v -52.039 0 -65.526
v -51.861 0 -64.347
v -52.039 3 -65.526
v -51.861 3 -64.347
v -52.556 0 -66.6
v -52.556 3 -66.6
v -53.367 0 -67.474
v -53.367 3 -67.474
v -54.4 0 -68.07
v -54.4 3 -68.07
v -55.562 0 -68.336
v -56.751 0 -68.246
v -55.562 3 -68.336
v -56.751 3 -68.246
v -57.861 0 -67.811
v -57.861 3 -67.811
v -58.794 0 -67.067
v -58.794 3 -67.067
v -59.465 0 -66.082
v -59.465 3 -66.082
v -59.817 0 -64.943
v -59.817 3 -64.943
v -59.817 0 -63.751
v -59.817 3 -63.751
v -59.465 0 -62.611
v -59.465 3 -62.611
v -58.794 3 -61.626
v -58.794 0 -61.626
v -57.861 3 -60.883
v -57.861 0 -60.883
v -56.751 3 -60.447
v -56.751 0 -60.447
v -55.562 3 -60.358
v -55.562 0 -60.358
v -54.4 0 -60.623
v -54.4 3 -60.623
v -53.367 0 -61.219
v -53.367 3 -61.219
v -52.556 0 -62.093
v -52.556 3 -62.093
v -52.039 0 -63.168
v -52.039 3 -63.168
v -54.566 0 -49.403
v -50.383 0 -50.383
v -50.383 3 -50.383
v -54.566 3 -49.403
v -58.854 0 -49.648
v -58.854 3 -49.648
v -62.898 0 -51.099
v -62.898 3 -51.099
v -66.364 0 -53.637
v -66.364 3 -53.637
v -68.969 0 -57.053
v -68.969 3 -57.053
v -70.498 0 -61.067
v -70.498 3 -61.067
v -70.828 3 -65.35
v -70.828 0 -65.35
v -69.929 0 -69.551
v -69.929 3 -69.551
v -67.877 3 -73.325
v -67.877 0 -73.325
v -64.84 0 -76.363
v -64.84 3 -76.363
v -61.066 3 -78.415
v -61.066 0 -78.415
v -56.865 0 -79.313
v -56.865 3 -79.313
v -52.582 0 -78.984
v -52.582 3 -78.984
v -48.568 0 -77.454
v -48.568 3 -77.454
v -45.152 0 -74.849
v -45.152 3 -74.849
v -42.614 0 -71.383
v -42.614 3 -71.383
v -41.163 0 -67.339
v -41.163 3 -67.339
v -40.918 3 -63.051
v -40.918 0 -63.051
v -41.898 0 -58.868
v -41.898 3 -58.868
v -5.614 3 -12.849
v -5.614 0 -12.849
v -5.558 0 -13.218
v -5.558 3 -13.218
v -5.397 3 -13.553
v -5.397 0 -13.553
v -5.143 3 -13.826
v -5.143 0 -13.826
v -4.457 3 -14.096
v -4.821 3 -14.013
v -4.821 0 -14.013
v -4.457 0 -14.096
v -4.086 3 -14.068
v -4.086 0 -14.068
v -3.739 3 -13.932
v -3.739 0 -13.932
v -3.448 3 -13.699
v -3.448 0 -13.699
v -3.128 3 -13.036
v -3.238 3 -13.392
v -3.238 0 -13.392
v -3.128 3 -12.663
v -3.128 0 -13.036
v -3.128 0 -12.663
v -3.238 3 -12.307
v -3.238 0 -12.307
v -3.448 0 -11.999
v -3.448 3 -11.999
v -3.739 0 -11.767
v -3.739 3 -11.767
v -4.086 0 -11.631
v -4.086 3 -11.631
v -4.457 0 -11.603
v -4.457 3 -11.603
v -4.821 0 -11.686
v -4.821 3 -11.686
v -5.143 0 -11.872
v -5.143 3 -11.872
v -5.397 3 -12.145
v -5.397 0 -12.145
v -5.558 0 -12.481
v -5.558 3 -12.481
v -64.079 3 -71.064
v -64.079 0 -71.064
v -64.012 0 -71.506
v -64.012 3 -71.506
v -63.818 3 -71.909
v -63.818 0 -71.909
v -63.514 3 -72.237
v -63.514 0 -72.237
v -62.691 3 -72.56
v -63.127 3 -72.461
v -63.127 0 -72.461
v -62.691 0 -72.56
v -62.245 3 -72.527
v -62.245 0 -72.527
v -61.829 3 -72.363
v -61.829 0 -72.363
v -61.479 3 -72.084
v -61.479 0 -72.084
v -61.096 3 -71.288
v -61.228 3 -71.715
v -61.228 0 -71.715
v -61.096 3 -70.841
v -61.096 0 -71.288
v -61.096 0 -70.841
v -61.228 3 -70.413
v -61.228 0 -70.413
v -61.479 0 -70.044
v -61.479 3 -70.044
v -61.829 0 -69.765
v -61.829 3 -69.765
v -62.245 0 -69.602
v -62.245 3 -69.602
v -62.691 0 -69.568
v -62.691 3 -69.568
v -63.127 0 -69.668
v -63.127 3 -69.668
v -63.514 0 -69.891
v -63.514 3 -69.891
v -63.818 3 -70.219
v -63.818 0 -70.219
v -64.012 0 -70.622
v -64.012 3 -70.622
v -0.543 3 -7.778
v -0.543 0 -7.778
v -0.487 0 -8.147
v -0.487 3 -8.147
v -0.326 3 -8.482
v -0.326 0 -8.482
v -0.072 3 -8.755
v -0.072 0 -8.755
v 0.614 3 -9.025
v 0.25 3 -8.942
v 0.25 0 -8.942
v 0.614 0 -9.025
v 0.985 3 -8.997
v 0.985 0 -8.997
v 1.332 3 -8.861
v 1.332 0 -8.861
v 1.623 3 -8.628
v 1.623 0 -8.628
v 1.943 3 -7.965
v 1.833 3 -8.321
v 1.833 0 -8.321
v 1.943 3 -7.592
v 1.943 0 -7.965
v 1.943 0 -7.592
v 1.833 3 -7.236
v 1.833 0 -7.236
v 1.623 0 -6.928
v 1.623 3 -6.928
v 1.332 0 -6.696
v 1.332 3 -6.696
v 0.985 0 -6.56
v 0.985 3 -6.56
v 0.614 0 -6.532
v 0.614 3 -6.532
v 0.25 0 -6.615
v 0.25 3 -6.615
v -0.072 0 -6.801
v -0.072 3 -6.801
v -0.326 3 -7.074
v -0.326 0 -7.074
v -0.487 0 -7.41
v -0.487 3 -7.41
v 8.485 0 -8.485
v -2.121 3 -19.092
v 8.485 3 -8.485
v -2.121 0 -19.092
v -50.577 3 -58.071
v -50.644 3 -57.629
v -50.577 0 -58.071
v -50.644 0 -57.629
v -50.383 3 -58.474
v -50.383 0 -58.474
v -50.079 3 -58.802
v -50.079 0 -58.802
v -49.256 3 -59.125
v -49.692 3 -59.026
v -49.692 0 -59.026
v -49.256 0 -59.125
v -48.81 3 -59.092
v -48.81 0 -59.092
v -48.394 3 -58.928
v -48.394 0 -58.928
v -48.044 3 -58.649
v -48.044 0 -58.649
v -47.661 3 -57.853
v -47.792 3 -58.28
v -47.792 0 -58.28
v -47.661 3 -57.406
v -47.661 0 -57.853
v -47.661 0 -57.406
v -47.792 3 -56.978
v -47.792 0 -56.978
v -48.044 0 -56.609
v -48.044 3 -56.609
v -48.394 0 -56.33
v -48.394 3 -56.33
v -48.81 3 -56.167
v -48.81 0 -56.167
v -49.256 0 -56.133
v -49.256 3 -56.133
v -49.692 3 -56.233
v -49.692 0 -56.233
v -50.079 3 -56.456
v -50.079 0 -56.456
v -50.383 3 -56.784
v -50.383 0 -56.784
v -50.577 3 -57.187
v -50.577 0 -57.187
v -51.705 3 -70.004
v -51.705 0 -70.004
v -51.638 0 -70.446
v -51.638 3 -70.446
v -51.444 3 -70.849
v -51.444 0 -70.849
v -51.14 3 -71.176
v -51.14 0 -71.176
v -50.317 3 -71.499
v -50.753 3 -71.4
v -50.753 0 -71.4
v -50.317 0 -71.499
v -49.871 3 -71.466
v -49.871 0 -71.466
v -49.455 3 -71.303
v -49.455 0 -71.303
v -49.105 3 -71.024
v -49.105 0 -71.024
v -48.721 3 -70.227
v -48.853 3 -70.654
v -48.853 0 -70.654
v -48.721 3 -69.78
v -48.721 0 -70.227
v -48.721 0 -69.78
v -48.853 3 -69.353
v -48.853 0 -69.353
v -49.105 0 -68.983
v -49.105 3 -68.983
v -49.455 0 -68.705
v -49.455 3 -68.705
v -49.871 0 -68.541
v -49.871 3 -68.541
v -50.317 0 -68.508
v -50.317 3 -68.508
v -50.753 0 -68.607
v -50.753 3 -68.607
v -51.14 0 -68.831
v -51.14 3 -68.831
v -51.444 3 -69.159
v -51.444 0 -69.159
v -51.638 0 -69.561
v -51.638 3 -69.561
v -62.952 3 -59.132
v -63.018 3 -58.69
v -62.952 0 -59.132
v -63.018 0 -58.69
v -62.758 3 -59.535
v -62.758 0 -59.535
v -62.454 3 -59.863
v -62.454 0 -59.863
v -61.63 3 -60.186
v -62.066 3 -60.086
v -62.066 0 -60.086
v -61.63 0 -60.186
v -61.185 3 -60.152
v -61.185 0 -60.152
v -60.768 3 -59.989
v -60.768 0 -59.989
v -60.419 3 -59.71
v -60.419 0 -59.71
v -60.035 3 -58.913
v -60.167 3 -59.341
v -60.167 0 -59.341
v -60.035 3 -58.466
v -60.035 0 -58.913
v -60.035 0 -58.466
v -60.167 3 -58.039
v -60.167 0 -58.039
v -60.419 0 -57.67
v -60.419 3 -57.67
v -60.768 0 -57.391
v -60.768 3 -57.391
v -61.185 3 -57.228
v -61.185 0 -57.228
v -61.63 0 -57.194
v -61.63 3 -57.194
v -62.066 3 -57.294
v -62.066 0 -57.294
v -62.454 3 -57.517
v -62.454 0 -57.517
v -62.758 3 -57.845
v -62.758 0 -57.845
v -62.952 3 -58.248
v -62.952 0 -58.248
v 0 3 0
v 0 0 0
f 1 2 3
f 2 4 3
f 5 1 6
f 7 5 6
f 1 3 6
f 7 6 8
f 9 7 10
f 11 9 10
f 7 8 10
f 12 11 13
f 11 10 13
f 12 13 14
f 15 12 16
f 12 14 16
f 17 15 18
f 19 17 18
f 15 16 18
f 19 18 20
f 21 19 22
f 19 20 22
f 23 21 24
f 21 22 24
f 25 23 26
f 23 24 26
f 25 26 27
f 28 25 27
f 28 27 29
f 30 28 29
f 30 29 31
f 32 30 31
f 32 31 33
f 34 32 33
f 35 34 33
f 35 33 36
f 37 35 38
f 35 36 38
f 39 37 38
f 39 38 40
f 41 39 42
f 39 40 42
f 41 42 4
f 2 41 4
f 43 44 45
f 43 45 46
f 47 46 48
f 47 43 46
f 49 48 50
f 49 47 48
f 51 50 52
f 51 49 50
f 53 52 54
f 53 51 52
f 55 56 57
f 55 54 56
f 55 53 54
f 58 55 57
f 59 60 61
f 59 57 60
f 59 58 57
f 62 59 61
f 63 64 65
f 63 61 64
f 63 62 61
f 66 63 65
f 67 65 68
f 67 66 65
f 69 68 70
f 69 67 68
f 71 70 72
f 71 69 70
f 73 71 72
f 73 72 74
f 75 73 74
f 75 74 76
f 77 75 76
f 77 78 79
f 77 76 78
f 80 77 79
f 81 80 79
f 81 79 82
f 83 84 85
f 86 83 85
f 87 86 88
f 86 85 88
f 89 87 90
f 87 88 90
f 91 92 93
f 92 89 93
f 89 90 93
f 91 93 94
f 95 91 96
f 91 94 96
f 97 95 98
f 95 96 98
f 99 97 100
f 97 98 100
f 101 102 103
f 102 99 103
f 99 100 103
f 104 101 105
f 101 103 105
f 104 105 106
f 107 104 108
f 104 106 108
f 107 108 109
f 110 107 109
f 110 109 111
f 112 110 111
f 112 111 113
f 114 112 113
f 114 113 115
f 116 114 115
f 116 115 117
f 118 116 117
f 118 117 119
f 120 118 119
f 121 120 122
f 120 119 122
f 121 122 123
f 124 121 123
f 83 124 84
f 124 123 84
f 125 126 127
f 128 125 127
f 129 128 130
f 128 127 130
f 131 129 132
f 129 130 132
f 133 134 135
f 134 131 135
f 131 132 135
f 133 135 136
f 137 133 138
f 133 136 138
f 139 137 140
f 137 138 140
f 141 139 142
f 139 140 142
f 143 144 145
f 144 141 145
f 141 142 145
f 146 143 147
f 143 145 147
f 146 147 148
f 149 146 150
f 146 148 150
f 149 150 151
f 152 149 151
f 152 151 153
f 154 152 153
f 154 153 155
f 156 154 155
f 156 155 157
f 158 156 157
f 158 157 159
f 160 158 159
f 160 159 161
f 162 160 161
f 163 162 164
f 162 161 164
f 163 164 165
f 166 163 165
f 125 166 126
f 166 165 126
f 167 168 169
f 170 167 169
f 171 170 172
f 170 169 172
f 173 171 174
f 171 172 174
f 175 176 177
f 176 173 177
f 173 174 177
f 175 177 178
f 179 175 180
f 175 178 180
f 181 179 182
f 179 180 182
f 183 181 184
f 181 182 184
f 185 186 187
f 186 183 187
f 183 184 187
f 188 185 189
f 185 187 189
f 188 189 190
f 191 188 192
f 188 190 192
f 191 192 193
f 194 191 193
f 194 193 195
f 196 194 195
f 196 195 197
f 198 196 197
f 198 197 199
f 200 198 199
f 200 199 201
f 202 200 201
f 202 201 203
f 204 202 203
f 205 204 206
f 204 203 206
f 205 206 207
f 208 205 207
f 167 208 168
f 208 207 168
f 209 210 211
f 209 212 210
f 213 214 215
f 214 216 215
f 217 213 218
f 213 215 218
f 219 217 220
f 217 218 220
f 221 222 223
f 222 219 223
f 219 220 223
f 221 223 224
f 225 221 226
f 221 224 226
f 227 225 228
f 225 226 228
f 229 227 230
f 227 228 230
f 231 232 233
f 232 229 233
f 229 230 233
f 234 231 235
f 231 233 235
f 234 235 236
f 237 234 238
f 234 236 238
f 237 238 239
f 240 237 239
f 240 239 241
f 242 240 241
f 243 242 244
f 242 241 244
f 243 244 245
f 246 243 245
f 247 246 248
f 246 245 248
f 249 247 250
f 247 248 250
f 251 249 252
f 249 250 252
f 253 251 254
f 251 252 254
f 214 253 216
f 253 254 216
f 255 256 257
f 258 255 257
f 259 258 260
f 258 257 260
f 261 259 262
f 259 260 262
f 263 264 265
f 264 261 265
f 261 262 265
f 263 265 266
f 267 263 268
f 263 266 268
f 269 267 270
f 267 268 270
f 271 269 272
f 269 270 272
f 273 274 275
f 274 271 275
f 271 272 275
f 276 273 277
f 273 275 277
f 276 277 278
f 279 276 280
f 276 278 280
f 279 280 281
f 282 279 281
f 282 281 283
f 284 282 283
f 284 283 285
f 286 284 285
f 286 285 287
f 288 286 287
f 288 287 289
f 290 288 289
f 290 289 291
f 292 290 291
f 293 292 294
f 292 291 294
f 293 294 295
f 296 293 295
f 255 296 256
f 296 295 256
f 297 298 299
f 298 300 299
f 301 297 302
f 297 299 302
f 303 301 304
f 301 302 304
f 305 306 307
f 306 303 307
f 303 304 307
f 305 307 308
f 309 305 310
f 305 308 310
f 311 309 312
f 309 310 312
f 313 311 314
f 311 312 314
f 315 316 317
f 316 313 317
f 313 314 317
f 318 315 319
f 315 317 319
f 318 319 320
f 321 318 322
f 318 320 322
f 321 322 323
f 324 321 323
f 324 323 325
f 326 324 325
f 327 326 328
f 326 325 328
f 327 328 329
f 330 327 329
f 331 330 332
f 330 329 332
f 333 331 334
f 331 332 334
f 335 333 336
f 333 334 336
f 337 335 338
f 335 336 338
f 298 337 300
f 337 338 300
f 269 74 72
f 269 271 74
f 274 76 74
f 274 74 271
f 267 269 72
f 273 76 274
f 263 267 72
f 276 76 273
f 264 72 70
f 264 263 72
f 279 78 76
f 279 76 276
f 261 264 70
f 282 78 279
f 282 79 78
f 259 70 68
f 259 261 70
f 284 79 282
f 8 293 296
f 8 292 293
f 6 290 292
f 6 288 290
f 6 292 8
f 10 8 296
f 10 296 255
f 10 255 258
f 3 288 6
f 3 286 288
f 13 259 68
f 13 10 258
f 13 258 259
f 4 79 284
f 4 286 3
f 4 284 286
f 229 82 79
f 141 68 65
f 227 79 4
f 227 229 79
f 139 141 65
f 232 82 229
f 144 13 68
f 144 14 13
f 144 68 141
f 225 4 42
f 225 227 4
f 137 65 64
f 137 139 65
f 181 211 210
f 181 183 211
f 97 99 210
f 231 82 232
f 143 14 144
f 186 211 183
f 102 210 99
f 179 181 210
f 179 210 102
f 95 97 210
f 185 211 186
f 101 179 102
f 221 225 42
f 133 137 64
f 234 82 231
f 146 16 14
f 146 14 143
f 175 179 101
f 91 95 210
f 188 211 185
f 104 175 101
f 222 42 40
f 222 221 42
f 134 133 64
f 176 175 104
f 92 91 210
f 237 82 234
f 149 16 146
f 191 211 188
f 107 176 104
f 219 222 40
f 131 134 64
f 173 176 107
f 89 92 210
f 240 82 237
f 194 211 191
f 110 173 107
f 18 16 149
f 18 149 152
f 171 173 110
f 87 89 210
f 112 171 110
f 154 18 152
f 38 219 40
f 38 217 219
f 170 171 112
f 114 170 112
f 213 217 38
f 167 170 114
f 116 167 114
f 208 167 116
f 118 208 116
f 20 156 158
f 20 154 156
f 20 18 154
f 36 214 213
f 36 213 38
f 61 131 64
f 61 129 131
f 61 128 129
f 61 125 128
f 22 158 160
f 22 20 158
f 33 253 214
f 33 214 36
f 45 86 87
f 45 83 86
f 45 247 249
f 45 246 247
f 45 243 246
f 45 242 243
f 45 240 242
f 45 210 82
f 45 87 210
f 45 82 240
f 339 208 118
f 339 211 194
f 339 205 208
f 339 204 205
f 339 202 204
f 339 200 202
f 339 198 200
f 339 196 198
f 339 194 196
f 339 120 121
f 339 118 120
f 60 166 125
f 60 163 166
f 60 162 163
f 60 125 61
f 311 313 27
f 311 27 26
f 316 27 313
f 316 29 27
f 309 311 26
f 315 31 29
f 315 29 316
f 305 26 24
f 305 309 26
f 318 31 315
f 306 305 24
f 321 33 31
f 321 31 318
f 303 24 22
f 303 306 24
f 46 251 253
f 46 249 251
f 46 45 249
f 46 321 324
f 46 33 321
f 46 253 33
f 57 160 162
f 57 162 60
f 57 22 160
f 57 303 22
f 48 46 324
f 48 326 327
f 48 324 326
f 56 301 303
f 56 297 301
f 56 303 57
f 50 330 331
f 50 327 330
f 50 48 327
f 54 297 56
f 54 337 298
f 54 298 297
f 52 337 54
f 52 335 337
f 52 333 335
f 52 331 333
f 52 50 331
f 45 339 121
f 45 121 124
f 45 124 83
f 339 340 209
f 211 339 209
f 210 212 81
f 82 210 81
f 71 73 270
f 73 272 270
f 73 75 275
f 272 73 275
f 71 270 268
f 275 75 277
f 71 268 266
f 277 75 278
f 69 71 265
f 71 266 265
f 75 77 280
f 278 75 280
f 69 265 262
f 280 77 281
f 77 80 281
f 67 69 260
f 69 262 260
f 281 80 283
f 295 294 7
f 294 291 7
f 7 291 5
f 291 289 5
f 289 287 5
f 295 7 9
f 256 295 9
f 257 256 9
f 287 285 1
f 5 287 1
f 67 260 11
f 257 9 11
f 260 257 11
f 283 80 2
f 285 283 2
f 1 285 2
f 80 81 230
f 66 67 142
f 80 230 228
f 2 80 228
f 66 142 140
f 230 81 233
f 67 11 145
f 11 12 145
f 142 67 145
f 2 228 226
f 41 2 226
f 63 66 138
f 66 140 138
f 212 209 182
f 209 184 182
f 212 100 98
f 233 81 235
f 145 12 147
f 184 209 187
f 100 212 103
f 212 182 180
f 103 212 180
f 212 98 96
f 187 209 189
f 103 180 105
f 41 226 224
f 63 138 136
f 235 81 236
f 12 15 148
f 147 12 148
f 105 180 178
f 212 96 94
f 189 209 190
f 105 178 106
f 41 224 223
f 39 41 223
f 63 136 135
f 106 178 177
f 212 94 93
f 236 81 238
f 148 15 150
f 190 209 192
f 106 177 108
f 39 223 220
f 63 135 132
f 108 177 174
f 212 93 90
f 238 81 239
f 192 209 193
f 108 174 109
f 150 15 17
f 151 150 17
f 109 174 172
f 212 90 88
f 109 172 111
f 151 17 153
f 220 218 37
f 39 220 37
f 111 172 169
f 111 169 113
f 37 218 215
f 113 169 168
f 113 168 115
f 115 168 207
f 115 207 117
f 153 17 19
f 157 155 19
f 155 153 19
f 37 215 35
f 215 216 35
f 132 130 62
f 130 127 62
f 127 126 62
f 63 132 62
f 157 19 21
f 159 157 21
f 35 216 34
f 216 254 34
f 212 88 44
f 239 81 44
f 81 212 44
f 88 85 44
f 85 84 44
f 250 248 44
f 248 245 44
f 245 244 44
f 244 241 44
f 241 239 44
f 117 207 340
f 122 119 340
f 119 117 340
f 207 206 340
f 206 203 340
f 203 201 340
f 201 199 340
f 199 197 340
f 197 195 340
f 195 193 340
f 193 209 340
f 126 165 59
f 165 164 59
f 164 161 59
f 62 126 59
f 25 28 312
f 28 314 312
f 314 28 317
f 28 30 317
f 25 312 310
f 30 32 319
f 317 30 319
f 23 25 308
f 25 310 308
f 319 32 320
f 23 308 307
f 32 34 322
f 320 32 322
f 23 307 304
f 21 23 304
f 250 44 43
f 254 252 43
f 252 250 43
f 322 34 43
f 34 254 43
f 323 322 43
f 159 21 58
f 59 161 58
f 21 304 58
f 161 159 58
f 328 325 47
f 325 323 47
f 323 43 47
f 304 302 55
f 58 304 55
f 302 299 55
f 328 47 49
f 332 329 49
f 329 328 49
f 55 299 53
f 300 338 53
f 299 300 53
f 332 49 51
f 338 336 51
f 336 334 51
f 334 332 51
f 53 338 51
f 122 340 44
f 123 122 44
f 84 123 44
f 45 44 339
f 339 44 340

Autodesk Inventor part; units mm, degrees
ref_plane "YZ Plane" through (0, 0, 0) normal (1, 0, 0) x (0, 1, 0)
ref_plane "XZ Plane" through (0, 0, 0) normal (0, 1, 0) x (-1, 0, 0)
ref_plane "XY Plane" through (0, 0, 0) normal (0, 0, 1) x (1, 0, 0)
sketch "Sketch1" plane through (0, 0, 0) normal (0, 1, 0) x (-1, 0, 0)
  circle A0 centre (4.364, -12.8492) radius 1.25
  line L0 (2.1213, -19.0919) -> (-8.4853, -8.4853)
  line L1 (10.6066, -10.6066) -> (0, 0)
  line L2 (0, 0) -> (-8.4853, -8.4853)
  circle A1 centre (-0.7071, -7.7782) radius 1.25
  line L3 (2.1213, -19.0919) -> (41.8977, -58.8682)
  line L4 (10.6066, -10.6066) -> (50.383, -50.383)
  arc A2 (41.8977, -58.8682) -> (50.383, -50.383) centre (55.8614, -64.3467) ccw
  circle A3 centre (62.579, -71.0642) radius 1.5
  circle A4 centre (49.1439, -57.6292) radius 1.5
  circle A5 centre (50.2046, -70.0036) radius 1.5
  circle A6 centre (61.5183, -58.6899) radius 1.5
  point P0 (0, 0)
  dimension "d3" = 3
  dimension "d4" = 3
  dimension "d5" = 3
  dimension "d6" = 3
extrude "Extrusion1" add sketch "Sketch1" along normal blind 3
sketch "Sketch2" plane through (0, 3, 0) normal (0, 1, 0) x (1, 0, 0)
  arc A0 (-41.8977, 58.8682) -> (-50.383, 50.383) centre (-55.8614, 64.3467) ccw projected
  circle A1 centre (-55.8614, 64.3467) radius 4
  point P0 (0, 0)
  dimension "d9" = 8
extrude "Extrusion2" cut sketch "Sketch2" against normal blind 3
properties part number "arm"
